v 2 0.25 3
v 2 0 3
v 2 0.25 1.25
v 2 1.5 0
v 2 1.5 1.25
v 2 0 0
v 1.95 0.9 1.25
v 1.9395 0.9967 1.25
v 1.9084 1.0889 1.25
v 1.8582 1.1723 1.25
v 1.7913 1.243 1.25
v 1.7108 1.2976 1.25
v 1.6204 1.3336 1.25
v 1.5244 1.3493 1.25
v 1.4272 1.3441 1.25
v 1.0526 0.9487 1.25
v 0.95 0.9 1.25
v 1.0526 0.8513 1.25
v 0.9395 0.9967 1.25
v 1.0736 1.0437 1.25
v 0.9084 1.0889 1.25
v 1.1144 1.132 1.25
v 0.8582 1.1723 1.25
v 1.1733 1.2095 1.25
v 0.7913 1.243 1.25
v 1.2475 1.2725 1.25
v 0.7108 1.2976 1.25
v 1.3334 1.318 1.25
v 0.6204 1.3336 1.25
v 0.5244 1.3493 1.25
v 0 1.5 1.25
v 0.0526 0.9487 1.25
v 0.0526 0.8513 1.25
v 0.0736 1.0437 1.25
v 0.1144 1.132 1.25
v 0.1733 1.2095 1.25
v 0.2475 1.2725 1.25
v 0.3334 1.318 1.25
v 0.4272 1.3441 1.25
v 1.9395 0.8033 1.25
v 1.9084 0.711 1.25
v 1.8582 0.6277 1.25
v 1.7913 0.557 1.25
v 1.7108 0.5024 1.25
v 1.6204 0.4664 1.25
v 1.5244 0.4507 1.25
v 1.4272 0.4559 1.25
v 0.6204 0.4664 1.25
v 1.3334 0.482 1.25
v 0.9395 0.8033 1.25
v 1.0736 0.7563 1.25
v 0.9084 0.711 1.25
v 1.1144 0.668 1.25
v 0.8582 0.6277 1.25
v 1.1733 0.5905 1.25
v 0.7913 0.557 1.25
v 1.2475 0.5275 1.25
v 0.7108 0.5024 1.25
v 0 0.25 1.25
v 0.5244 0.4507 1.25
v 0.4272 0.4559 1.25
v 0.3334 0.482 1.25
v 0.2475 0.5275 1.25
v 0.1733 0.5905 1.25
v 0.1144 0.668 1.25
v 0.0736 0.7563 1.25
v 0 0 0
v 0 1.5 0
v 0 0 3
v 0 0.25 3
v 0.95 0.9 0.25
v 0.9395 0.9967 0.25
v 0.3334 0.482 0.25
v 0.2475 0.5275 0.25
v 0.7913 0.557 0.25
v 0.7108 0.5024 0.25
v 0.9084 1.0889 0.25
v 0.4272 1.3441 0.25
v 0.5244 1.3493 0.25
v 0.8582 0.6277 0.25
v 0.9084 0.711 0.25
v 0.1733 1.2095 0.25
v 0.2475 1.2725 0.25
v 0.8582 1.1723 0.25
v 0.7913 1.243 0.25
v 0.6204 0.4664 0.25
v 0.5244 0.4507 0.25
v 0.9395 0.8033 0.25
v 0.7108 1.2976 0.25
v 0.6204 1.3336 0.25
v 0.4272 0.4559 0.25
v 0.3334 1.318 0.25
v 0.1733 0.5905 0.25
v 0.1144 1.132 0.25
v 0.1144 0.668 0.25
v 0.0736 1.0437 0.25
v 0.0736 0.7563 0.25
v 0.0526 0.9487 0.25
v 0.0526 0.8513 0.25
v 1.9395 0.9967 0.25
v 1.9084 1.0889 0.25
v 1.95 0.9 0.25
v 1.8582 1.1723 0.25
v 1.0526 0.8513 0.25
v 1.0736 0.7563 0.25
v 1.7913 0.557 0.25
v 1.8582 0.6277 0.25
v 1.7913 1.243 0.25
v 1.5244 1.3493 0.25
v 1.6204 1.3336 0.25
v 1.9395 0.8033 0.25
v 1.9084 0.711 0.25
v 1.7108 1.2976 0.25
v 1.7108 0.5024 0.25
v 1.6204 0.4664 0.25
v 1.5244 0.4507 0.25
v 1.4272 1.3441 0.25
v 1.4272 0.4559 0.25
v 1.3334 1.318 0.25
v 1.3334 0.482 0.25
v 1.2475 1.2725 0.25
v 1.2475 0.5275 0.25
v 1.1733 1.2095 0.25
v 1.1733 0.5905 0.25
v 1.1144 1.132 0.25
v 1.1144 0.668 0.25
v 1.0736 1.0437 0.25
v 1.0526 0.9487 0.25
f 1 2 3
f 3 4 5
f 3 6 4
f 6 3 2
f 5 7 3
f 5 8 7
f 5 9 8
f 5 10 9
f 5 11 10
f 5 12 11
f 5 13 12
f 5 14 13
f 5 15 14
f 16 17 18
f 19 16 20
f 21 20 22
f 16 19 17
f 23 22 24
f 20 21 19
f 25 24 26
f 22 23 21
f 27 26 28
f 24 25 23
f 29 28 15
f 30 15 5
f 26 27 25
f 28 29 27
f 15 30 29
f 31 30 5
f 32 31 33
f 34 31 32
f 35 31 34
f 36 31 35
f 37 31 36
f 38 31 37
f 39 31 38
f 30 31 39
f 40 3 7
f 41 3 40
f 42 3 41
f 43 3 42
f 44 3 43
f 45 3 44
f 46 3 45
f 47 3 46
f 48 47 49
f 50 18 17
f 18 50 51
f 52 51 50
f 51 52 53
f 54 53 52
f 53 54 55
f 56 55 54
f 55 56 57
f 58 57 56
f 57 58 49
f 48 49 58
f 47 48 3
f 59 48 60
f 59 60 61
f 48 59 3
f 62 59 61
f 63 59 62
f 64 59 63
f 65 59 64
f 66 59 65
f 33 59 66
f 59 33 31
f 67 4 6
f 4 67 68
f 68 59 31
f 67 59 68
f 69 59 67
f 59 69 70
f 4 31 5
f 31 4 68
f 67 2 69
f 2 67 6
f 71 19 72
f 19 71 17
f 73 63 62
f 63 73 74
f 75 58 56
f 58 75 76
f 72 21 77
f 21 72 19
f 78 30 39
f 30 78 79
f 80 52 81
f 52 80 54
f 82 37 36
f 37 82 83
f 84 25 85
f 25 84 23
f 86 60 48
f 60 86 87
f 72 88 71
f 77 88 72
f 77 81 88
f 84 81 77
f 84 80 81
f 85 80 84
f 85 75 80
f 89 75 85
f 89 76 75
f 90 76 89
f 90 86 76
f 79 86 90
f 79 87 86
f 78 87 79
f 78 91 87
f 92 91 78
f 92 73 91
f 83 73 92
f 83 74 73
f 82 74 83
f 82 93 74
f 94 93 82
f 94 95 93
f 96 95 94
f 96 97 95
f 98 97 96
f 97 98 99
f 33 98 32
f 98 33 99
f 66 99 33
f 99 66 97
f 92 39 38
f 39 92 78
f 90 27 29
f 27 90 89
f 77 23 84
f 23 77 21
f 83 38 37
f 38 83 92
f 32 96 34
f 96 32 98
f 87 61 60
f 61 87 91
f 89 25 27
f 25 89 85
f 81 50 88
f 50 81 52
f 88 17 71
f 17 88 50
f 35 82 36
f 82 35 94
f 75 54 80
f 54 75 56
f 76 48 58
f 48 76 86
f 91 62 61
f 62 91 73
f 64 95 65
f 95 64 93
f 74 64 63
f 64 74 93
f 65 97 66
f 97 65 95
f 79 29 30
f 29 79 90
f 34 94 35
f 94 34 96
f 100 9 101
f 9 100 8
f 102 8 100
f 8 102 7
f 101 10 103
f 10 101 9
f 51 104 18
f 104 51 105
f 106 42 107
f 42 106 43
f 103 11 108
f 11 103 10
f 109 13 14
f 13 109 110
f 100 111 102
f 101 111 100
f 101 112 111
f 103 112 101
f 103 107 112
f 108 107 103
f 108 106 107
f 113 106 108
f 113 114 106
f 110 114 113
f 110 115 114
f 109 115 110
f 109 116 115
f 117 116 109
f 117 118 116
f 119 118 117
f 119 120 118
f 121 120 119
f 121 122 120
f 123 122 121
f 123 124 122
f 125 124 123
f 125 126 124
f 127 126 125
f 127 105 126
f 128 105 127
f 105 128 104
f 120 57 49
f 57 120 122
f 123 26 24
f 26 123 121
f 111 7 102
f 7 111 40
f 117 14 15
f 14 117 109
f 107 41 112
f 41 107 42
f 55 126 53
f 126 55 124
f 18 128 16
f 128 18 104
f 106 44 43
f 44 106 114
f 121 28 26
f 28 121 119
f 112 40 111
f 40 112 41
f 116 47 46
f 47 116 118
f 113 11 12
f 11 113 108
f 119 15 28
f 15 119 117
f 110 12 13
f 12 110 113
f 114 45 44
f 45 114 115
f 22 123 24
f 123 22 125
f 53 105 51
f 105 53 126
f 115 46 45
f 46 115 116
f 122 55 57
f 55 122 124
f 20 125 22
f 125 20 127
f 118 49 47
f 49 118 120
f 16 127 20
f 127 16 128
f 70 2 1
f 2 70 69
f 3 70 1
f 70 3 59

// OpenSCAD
$fa = 0.05;
$fs = 0.1;

cube([2,0.25,3]);

difference() {
cube([2,1.5,1.25]);
translate([0.5, 0.9, 0.25])
    cylinder(3, 0.45, 0.45);
translate([1.5, 0.9, 0.25])
    cylinder(3, 0.45, 0.45);
}
